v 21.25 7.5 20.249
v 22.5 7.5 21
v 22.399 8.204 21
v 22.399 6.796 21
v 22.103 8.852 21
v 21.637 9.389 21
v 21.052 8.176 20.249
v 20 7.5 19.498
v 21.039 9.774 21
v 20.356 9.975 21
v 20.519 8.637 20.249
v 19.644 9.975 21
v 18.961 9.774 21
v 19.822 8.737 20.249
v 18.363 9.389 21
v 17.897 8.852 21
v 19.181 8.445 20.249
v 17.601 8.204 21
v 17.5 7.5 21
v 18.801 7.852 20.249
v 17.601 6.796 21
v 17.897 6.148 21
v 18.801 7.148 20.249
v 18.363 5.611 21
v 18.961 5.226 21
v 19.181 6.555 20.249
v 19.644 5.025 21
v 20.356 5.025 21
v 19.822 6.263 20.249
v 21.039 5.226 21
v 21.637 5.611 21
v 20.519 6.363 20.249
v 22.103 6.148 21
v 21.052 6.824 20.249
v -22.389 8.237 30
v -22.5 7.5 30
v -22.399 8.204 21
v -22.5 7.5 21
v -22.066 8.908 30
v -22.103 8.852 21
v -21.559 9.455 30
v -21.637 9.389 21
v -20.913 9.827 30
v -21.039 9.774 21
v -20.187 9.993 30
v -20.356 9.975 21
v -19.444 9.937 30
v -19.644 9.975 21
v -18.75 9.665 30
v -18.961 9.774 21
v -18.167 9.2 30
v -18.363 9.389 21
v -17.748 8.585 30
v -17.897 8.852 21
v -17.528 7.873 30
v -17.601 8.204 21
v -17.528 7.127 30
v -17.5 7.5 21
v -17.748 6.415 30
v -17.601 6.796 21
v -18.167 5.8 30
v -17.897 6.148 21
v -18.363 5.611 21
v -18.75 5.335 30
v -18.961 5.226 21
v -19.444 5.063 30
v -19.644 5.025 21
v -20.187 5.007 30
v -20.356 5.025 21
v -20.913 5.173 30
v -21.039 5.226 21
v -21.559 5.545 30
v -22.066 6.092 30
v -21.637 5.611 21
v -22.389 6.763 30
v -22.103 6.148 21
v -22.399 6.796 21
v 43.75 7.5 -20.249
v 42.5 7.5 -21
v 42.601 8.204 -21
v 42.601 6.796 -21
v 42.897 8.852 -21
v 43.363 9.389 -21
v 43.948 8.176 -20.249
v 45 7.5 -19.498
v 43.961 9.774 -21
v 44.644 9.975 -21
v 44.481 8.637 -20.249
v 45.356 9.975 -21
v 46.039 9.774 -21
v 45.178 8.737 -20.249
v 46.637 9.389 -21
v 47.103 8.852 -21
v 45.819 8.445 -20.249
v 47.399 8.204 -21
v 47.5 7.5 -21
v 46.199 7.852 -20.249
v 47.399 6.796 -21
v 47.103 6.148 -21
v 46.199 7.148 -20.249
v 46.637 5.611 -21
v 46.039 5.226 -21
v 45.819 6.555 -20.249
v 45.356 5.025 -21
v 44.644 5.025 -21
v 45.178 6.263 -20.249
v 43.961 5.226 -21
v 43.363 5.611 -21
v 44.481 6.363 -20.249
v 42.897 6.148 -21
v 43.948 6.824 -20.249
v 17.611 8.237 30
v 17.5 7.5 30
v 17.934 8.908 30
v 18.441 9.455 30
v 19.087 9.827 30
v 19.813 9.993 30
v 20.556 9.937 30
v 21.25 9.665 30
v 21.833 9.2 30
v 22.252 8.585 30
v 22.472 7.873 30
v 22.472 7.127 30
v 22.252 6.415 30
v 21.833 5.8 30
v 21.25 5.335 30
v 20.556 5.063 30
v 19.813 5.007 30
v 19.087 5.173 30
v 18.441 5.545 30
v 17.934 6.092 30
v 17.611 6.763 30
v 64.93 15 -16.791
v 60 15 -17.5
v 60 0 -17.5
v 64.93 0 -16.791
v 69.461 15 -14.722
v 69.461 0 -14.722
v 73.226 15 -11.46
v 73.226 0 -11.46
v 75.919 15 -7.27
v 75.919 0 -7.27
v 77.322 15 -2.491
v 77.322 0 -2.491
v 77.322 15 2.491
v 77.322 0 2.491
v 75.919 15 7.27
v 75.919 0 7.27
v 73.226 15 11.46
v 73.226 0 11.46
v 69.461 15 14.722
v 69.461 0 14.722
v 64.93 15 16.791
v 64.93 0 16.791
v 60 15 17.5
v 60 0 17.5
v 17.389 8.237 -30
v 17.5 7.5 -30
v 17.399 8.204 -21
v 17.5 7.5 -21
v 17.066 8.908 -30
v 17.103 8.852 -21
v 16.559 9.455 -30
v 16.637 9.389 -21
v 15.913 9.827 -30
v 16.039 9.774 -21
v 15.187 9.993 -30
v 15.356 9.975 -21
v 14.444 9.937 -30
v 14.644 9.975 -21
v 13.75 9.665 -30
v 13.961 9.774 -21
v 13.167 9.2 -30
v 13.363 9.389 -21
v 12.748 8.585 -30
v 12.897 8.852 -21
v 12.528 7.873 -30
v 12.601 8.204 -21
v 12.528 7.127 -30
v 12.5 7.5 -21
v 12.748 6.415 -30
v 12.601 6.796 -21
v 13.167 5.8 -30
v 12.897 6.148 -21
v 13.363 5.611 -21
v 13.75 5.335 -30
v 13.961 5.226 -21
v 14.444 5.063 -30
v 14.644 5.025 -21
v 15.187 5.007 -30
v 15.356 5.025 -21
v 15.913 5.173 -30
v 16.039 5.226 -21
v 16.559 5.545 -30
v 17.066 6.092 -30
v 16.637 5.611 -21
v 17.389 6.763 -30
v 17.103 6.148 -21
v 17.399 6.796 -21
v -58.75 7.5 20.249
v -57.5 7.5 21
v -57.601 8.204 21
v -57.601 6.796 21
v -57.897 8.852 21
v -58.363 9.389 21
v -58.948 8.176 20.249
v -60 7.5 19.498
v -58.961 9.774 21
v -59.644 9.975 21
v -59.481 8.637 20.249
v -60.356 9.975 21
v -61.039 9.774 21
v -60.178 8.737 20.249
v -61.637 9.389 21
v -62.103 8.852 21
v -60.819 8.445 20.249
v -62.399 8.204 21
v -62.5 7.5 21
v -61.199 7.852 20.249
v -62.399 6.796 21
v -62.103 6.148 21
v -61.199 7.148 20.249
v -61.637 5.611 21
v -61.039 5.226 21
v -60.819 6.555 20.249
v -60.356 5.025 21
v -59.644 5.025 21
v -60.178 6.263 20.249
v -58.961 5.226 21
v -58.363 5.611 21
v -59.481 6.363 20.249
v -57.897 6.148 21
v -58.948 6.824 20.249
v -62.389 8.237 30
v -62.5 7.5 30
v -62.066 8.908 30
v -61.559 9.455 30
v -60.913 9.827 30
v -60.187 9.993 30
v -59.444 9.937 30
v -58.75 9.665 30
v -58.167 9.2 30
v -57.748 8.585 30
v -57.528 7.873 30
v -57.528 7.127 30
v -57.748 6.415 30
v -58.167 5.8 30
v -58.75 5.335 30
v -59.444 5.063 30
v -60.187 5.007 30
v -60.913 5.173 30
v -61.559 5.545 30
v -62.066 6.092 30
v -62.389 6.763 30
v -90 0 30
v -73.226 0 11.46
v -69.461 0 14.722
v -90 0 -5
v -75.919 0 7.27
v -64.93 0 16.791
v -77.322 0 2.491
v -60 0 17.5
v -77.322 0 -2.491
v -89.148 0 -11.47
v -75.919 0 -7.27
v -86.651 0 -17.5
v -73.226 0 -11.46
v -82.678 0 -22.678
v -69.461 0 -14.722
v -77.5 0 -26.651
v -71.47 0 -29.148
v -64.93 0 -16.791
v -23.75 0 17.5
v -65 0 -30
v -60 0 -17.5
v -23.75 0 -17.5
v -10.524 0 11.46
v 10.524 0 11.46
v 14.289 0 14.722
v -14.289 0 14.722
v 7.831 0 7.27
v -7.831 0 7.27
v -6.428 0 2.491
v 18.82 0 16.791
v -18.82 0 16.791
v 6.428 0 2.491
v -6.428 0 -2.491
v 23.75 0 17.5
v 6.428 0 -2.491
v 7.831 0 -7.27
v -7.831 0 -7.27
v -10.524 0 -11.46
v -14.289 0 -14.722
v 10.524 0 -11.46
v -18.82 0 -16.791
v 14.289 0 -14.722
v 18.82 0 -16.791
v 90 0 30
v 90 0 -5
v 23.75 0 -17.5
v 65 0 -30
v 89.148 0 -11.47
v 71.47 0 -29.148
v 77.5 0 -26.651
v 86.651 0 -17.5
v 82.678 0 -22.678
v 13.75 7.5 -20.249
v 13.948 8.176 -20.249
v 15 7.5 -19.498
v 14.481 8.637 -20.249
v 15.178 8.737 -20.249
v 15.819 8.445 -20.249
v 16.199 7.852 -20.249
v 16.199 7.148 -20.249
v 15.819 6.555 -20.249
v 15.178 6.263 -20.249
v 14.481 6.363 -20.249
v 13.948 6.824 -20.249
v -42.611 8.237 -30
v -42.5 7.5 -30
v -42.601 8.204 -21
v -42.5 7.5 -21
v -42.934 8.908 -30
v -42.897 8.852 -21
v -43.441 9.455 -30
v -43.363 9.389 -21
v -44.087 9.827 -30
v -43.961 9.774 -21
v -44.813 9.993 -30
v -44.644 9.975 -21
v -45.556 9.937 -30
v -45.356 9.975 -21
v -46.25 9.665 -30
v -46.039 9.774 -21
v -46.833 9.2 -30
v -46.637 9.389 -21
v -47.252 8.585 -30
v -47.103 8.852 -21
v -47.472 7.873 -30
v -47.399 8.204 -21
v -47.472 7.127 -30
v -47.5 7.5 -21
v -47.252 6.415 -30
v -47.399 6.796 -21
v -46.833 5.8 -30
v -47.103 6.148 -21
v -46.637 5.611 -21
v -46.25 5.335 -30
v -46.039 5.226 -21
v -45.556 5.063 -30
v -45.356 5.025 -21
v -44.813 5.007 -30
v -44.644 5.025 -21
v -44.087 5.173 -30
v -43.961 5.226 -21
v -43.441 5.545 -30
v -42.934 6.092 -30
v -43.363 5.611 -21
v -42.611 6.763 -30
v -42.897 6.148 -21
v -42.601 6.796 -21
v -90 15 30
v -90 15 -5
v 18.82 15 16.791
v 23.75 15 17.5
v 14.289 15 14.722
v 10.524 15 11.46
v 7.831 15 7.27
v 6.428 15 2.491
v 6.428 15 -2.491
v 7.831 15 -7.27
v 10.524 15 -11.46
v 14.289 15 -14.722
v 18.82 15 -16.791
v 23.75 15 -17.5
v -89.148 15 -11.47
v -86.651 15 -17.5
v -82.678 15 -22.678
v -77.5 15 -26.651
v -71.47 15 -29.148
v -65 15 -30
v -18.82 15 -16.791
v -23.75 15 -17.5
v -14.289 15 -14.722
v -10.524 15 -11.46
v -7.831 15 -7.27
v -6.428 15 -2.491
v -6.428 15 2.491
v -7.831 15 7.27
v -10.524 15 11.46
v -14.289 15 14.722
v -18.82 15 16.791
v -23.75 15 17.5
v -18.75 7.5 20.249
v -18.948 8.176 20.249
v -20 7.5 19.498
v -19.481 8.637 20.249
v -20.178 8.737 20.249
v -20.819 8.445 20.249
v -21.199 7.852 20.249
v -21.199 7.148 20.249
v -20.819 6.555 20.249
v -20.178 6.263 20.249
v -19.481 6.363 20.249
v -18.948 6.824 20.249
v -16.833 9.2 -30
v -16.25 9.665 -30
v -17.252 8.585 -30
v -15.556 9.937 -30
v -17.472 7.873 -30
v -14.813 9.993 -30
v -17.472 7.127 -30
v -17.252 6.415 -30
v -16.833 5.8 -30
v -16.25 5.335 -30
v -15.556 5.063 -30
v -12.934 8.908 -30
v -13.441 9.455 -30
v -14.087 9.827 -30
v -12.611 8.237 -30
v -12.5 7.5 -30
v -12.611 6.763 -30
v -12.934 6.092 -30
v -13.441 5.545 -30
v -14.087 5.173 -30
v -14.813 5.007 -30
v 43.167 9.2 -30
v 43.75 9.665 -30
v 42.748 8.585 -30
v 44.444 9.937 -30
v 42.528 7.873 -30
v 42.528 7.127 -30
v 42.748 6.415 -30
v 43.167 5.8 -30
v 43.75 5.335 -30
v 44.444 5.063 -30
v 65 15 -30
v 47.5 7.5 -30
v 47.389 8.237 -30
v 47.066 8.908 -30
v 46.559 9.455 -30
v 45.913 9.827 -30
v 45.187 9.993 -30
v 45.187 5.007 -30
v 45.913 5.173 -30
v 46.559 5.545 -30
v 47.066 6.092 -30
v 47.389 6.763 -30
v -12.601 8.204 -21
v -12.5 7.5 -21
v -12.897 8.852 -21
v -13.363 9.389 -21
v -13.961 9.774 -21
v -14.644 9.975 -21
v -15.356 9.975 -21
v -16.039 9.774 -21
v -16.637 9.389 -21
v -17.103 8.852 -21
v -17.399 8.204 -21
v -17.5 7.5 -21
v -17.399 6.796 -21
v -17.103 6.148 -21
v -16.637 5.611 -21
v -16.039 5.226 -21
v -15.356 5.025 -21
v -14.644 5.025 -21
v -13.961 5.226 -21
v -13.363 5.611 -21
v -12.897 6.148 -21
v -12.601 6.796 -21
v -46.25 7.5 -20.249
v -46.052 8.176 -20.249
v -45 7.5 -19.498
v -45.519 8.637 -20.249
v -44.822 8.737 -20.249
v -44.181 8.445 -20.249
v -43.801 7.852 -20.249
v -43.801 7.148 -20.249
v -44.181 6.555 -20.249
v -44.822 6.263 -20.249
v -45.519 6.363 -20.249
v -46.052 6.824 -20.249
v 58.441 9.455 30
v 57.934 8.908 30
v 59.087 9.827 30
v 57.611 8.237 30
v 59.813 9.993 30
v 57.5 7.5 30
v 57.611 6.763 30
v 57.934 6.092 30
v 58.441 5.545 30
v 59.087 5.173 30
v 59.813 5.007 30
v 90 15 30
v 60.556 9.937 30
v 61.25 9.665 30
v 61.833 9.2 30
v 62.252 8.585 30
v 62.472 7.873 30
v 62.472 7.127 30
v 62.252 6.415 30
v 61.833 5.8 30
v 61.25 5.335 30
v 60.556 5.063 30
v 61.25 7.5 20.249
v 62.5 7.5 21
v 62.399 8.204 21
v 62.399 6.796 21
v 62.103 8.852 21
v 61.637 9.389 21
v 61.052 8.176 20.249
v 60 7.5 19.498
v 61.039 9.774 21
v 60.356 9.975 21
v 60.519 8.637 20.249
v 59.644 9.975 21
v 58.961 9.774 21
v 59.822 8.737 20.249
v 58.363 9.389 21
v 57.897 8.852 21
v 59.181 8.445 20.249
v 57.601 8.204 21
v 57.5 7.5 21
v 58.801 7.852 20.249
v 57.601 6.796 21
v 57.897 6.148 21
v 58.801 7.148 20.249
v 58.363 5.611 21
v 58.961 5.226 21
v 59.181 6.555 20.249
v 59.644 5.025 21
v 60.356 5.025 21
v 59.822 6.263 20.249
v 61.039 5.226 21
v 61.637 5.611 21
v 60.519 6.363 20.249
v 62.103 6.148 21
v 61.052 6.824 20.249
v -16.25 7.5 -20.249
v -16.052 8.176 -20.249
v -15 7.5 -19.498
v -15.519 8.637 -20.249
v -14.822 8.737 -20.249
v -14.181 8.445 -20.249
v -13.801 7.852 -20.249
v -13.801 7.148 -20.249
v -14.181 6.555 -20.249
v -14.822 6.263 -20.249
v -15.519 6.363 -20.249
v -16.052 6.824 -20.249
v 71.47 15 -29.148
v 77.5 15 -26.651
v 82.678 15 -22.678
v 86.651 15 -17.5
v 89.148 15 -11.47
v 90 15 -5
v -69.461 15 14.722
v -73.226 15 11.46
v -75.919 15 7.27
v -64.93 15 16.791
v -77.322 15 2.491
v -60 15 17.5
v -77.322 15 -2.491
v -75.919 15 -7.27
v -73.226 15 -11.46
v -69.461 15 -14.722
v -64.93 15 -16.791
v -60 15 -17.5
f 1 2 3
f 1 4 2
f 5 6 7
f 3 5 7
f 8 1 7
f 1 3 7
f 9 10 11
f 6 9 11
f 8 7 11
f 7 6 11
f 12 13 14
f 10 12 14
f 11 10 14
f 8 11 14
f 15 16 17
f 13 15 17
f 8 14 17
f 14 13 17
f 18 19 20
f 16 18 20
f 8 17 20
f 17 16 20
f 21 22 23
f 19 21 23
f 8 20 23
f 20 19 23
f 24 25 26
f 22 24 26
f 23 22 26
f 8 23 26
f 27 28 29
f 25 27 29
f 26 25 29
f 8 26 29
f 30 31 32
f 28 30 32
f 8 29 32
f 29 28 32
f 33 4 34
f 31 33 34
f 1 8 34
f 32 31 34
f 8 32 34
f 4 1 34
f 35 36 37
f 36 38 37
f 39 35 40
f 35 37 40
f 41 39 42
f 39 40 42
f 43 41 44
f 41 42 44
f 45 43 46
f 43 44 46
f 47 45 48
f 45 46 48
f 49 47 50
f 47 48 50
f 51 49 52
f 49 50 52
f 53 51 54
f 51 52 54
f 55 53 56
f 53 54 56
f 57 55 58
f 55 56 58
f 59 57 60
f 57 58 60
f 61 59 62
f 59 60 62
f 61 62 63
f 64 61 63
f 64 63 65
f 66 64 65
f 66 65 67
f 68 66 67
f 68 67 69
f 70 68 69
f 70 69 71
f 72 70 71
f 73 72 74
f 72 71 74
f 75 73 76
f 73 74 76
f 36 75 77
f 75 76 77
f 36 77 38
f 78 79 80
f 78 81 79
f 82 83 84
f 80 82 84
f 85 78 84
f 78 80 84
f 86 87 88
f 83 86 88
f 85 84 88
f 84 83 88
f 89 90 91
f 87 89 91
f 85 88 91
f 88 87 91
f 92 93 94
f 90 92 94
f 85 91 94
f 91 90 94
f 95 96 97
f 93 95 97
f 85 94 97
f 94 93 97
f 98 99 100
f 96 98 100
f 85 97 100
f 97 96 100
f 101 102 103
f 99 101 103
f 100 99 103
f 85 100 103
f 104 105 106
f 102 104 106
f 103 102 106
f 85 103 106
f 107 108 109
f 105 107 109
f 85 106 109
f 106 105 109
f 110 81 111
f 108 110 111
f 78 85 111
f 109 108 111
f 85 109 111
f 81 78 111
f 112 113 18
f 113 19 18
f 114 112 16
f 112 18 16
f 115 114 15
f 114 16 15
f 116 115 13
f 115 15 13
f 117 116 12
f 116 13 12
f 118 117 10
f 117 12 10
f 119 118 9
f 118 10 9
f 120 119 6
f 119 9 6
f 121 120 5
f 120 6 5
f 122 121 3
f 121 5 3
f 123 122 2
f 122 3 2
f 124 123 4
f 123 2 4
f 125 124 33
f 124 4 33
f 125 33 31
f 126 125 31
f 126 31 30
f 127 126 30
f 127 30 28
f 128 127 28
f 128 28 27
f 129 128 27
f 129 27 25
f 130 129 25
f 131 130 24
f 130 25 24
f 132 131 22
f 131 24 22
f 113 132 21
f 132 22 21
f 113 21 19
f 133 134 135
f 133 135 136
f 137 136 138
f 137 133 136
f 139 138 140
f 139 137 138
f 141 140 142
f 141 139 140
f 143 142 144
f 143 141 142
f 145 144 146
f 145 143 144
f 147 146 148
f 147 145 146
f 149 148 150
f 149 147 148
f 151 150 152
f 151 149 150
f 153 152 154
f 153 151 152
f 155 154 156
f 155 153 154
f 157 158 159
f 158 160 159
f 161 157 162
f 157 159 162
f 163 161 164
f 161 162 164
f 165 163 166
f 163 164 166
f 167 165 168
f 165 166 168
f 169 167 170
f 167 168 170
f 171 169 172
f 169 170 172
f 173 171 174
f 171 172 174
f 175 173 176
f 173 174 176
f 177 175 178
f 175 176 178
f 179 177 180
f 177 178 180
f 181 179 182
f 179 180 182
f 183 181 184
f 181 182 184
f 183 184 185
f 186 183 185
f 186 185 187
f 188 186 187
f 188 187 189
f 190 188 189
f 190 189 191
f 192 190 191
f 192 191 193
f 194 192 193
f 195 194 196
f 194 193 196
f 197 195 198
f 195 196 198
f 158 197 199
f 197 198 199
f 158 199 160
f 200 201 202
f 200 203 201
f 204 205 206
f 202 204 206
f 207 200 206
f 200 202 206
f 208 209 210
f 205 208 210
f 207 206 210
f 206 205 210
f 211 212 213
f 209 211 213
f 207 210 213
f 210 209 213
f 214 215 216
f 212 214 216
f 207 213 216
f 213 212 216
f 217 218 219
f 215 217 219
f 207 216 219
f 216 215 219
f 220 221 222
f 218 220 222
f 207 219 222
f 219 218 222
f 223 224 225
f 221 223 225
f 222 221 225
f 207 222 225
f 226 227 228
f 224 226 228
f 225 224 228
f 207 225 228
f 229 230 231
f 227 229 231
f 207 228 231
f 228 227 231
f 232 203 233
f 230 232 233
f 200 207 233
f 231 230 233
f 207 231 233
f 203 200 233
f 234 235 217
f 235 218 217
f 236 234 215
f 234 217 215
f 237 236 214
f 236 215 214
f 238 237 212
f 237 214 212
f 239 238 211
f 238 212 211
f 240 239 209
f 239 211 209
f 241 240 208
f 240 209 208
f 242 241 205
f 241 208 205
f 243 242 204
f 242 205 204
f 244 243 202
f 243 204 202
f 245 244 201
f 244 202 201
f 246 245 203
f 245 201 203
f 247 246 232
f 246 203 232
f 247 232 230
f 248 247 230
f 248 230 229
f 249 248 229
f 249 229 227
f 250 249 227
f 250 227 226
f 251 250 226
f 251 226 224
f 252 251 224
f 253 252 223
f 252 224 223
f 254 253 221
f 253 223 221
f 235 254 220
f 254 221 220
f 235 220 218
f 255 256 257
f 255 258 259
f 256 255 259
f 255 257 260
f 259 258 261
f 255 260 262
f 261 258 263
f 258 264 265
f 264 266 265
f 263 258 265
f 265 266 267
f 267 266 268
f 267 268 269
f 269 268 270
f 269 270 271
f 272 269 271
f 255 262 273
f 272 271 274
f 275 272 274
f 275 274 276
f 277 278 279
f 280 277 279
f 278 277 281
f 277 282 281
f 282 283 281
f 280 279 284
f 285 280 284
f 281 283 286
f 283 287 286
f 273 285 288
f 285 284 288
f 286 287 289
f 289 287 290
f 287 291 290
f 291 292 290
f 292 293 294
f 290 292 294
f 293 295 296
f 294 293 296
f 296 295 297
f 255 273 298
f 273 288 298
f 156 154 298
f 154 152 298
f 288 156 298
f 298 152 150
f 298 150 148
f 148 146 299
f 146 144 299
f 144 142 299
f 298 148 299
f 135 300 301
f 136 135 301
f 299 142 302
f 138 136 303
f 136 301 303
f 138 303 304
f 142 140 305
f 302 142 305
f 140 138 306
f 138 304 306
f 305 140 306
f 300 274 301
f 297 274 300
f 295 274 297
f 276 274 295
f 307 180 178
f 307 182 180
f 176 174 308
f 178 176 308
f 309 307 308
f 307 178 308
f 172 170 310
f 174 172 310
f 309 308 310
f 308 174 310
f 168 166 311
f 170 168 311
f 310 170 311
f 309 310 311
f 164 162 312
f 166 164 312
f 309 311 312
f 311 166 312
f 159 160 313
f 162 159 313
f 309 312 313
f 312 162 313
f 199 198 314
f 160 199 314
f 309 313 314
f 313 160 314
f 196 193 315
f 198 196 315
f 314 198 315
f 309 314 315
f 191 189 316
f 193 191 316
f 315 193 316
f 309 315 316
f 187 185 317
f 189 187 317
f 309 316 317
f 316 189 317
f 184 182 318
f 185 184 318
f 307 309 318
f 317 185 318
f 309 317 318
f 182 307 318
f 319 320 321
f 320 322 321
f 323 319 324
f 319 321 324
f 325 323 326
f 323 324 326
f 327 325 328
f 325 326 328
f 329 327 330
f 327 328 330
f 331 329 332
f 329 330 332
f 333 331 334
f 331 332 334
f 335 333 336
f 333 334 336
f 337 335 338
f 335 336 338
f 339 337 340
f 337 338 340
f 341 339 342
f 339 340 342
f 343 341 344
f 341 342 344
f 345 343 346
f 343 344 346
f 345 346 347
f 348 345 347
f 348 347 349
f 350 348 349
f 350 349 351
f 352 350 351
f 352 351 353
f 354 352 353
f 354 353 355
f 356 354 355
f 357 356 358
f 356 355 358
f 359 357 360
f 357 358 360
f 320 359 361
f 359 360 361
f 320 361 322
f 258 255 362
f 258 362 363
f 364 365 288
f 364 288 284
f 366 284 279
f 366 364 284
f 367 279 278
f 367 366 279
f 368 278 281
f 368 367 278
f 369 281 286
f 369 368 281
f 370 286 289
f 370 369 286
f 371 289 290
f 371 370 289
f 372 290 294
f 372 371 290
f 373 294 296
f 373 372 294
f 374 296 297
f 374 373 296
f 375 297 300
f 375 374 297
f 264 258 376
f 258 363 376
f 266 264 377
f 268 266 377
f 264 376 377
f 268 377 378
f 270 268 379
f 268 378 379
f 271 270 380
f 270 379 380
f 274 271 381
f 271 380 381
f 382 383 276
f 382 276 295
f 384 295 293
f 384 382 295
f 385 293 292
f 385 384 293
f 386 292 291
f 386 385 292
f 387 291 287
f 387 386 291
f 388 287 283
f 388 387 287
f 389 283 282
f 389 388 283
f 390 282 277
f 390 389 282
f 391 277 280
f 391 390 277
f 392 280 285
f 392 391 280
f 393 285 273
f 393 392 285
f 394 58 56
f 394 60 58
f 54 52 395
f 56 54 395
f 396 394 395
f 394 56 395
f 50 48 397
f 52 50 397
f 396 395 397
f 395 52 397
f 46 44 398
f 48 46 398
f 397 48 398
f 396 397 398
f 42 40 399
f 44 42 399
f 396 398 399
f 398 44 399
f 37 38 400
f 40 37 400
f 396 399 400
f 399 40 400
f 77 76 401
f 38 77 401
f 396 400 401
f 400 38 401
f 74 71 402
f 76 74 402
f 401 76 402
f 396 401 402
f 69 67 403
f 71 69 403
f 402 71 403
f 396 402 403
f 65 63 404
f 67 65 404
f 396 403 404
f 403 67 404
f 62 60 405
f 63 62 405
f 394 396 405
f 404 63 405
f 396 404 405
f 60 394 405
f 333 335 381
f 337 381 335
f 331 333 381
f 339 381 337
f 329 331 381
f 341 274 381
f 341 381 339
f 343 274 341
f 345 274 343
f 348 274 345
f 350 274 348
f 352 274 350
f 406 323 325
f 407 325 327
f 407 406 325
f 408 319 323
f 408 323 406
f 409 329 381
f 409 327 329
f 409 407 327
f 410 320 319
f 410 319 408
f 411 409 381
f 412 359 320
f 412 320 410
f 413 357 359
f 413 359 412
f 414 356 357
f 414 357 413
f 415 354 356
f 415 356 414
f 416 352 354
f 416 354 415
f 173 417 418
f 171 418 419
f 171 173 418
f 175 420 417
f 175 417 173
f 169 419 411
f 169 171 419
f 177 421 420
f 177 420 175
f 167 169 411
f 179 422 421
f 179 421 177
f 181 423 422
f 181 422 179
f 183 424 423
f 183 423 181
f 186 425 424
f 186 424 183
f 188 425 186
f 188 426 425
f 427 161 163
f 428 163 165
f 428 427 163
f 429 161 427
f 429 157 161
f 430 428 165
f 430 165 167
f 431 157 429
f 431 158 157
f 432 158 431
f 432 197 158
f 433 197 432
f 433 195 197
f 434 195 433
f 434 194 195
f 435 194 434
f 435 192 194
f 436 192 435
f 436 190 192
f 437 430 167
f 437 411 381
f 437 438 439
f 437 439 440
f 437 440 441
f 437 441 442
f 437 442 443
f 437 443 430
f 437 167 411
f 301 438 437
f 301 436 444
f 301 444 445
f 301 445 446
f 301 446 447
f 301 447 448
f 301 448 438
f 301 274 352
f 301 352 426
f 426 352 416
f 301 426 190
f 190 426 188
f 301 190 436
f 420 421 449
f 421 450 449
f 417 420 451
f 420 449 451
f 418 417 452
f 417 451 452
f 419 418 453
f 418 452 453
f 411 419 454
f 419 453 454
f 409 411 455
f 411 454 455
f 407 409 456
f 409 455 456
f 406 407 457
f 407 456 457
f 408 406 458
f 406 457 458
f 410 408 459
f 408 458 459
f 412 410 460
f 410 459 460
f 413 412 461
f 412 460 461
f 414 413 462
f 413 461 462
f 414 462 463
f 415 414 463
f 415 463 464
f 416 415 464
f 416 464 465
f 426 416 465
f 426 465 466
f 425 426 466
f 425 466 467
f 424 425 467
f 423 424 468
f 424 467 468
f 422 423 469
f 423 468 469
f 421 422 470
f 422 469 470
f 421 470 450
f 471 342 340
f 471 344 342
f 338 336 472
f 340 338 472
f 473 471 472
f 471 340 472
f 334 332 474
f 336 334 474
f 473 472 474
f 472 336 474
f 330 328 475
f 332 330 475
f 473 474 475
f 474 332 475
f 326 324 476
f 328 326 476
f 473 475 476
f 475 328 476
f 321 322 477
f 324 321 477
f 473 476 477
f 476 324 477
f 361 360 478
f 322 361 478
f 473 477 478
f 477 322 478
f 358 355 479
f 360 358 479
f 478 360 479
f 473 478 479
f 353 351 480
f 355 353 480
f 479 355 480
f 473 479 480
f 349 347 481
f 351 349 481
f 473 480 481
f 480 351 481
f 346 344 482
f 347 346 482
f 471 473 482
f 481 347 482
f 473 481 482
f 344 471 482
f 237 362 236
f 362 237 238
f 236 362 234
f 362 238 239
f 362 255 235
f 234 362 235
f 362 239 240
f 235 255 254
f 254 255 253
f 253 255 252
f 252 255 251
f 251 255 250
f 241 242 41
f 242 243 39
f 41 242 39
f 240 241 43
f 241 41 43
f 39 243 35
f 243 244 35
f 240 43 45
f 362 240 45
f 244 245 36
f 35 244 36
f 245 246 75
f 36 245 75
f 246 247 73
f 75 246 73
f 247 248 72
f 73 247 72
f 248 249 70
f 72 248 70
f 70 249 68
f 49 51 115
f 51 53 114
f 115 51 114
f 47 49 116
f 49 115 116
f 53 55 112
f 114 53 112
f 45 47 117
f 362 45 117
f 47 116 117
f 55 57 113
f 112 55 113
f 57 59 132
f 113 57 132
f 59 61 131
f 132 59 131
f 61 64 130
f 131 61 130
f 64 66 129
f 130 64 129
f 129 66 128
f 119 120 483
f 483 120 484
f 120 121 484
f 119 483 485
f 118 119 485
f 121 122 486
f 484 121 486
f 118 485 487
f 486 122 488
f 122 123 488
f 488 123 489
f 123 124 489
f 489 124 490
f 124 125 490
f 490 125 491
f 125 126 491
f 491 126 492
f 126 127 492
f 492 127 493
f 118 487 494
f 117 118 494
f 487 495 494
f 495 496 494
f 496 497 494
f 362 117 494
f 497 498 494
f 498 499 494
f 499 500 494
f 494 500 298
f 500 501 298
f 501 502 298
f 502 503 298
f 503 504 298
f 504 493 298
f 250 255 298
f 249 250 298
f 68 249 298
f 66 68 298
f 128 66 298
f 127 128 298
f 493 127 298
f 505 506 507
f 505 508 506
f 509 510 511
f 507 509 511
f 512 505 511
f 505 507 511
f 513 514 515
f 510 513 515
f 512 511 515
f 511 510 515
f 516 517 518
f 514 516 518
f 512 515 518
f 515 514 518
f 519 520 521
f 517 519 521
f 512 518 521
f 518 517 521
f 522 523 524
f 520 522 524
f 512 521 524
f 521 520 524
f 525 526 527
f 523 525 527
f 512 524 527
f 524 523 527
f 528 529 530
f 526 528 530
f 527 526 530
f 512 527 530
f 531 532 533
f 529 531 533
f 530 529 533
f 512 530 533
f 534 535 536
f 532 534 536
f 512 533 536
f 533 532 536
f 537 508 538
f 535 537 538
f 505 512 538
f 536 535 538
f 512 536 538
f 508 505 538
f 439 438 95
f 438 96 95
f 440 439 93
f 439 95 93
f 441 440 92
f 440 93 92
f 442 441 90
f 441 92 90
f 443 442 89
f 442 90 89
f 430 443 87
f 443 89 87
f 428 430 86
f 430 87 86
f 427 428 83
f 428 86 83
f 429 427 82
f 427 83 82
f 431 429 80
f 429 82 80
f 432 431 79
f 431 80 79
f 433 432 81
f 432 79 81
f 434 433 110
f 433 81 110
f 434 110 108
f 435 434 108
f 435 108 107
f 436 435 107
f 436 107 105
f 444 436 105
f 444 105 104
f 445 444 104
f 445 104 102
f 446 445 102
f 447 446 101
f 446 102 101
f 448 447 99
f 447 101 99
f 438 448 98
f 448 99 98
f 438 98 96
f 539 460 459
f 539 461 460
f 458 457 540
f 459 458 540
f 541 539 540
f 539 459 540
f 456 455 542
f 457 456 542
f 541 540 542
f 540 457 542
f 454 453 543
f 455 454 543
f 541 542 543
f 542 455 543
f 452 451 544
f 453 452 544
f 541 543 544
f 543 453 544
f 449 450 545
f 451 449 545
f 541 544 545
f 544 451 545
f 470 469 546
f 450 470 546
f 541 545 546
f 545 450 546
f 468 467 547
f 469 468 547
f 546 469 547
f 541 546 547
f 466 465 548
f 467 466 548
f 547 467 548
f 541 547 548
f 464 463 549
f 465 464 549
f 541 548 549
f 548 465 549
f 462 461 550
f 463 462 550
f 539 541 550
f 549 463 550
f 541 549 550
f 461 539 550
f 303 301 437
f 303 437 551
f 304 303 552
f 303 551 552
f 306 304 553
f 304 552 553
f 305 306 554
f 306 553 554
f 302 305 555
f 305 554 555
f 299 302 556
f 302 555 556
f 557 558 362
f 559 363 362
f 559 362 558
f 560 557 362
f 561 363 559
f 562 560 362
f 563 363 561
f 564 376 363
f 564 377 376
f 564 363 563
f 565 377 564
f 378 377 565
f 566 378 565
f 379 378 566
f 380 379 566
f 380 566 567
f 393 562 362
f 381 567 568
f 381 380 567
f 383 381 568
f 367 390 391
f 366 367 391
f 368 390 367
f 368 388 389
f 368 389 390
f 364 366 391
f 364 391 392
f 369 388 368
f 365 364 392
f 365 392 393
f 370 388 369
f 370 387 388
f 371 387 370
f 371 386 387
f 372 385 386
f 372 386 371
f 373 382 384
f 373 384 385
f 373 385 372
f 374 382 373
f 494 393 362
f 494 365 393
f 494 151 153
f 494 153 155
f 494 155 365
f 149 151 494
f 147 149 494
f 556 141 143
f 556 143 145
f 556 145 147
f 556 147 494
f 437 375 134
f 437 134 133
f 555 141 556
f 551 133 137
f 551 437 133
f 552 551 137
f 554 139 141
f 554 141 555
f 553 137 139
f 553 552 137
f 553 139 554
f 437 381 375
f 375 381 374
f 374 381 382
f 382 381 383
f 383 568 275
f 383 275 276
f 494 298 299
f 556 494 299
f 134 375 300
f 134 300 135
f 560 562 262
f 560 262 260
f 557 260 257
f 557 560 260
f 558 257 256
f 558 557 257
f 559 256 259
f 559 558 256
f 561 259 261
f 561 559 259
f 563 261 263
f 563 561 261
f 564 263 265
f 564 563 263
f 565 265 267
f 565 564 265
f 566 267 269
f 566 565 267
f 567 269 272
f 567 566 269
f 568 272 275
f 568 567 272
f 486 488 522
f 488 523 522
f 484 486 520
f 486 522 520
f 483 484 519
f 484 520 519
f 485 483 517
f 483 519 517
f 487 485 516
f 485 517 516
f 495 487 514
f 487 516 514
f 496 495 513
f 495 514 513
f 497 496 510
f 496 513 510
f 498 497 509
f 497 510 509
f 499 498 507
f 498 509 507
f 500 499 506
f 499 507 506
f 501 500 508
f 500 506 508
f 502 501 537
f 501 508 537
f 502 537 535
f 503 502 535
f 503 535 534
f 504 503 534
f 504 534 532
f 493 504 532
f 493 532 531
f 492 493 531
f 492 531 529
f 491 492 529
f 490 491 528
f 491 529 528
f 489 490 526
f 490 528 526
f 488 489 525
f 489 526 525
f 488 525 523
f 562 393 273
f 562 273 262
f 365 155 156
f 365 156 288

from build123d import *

# Parameters (mm, degrees)
SKETCH1_W                       = 180
SKETCH1_H                       = 60
BOSS_EXTRUDE1_DEPTH             = 15
CUT_EXTRUDE1_DEPTH              = 97.046863561
TAP_DRILL_FOR_M6X1_0_TAP1_D     = 5
TAP_DRILL_FOR_M6X1_0_TAP1_DEPTH = 9
TAP_DRILL_FOR_M6X1_0_TAP1_TIP   = 1.502151548
FILLET1_R                       = 25
TAP_DRILL_FOR_M6X1_0_TAP2_D     = 5
TAP_DRILL_FOR_M6X1_0_TAP2_DEPTH = 9
TAP_DRILL_FOR_M6X1_0_TAP2_TIP   = 1.502151548


with BuildPart() as part:
    # Sketch1 → Boss-Extrude1 (new body)
    with BuildSketch(Plane(origin=(0, 0, 0), x_dir=(1, 0, 0), z_dir=(0, 1, 0))):
        Rectangle(SKETCH1_W, SKETCH1_H)
    extrude(amount=BOSS_EXTRUDE1_DEPTH)

    # Sketch2 → Cut-Extrude1 (cut, through all)
    with BuildSketch(Plane(origin=(0, 15, 0), x_dir=(1, 0, 0), z_dir=(0, 1, 0))):
        with BuildLine():
            Line((-60, 17.5), (-23.75, 17.5))
            ThreePointArc((-23.75, 17.5), (-6.25, 0), (-23.75, -17.5))
            Line((-23.75, -17.5), (-60, -17.5))
            ThreePointArc((-60, -17.5), (-77.5, 0), (-60, 17.5))
        make_face()
        with BuildLine():
            Line((23.75, 17.5), (60, 17.5))
            ThreePointArc((60, 17.5), (77.5, 0), (60, -17.5))
            Line((60, -17.5), (23.75, -17.5))
            ThreePointArc((23.75, -17.5), (6.25, 0), (23.75, 17.5))
        make_face()
    extrude(amount=-CUT_EXTRUDE1_DEPTH, mode=Mode.SUBTRACT)

    # Tap Drill for M6x1.0 Tap1
    with Locations(Plane.XY.offset(30)):
        with Locations((60, 7.5), (-20, 7.5), (20, 7.5), (-60, 7.5)):
            Hole(TAP_DRILL_FOR_M6X1_0_TAP1_D / 2, depth=TAP_DRILL_FOR_M6X1_0_TAP1_DEPTH)
            with Locations((0, 0, -(TAP_DRILL_FOR_M6X1_0_TAP1_DEPTH + TAP_DRILL_FOR_M6X1_0_TAP1_TIP / 2))):  # 118° drill point
                Cone(0, TAP_DRILL_FOR_M6X1_0_TAP1_D / 2, TAP_DRILL_FOR_M6X1_0_TAP1_TIP, mode=Mode.SUBTRACT)

    # Fillet1
    fillet1_edges = [part.edges().sort_by_distance(p)[0] for p in [
        (-90, 7.5, -30),
        (90, 7.5, -30),
    ]]
    fillet(fillet1_edges, radius=FILLET1_R)

    # Tap Drill for M6x1.0 Tap2
    with Locations(Plane(origin=(0, 0, -30), x_dir=(-1, 0, 0), z_dir=(0, 0, -1))):
        with Locations((-45, 7.5), (-15, 7.5), (15, 7.5), (45, 7.5)):
            Hole(TAP_DRILL_FOR_M6X1_0_TAP2_D / 2, depth=TAP_DRILL_FOR_M6X1_0_TAP2_DEPTH)
            with Locations((0, 0, -(TAP_DRILL_FOR_M6X1_0_TAP2_DEPTH + TAP_DRILL_FOR_M6X1_0_TAP2_TIP / 2))):  # 118° drill point
                Cone(0, TAP_DRILL_FOR_M6X1_0_TAP2_D / 2, TAP_DRILL_FOR_M6X1_0_TAP2_TIP, mode=Mode.SUBTRACT)


solid = part.part
